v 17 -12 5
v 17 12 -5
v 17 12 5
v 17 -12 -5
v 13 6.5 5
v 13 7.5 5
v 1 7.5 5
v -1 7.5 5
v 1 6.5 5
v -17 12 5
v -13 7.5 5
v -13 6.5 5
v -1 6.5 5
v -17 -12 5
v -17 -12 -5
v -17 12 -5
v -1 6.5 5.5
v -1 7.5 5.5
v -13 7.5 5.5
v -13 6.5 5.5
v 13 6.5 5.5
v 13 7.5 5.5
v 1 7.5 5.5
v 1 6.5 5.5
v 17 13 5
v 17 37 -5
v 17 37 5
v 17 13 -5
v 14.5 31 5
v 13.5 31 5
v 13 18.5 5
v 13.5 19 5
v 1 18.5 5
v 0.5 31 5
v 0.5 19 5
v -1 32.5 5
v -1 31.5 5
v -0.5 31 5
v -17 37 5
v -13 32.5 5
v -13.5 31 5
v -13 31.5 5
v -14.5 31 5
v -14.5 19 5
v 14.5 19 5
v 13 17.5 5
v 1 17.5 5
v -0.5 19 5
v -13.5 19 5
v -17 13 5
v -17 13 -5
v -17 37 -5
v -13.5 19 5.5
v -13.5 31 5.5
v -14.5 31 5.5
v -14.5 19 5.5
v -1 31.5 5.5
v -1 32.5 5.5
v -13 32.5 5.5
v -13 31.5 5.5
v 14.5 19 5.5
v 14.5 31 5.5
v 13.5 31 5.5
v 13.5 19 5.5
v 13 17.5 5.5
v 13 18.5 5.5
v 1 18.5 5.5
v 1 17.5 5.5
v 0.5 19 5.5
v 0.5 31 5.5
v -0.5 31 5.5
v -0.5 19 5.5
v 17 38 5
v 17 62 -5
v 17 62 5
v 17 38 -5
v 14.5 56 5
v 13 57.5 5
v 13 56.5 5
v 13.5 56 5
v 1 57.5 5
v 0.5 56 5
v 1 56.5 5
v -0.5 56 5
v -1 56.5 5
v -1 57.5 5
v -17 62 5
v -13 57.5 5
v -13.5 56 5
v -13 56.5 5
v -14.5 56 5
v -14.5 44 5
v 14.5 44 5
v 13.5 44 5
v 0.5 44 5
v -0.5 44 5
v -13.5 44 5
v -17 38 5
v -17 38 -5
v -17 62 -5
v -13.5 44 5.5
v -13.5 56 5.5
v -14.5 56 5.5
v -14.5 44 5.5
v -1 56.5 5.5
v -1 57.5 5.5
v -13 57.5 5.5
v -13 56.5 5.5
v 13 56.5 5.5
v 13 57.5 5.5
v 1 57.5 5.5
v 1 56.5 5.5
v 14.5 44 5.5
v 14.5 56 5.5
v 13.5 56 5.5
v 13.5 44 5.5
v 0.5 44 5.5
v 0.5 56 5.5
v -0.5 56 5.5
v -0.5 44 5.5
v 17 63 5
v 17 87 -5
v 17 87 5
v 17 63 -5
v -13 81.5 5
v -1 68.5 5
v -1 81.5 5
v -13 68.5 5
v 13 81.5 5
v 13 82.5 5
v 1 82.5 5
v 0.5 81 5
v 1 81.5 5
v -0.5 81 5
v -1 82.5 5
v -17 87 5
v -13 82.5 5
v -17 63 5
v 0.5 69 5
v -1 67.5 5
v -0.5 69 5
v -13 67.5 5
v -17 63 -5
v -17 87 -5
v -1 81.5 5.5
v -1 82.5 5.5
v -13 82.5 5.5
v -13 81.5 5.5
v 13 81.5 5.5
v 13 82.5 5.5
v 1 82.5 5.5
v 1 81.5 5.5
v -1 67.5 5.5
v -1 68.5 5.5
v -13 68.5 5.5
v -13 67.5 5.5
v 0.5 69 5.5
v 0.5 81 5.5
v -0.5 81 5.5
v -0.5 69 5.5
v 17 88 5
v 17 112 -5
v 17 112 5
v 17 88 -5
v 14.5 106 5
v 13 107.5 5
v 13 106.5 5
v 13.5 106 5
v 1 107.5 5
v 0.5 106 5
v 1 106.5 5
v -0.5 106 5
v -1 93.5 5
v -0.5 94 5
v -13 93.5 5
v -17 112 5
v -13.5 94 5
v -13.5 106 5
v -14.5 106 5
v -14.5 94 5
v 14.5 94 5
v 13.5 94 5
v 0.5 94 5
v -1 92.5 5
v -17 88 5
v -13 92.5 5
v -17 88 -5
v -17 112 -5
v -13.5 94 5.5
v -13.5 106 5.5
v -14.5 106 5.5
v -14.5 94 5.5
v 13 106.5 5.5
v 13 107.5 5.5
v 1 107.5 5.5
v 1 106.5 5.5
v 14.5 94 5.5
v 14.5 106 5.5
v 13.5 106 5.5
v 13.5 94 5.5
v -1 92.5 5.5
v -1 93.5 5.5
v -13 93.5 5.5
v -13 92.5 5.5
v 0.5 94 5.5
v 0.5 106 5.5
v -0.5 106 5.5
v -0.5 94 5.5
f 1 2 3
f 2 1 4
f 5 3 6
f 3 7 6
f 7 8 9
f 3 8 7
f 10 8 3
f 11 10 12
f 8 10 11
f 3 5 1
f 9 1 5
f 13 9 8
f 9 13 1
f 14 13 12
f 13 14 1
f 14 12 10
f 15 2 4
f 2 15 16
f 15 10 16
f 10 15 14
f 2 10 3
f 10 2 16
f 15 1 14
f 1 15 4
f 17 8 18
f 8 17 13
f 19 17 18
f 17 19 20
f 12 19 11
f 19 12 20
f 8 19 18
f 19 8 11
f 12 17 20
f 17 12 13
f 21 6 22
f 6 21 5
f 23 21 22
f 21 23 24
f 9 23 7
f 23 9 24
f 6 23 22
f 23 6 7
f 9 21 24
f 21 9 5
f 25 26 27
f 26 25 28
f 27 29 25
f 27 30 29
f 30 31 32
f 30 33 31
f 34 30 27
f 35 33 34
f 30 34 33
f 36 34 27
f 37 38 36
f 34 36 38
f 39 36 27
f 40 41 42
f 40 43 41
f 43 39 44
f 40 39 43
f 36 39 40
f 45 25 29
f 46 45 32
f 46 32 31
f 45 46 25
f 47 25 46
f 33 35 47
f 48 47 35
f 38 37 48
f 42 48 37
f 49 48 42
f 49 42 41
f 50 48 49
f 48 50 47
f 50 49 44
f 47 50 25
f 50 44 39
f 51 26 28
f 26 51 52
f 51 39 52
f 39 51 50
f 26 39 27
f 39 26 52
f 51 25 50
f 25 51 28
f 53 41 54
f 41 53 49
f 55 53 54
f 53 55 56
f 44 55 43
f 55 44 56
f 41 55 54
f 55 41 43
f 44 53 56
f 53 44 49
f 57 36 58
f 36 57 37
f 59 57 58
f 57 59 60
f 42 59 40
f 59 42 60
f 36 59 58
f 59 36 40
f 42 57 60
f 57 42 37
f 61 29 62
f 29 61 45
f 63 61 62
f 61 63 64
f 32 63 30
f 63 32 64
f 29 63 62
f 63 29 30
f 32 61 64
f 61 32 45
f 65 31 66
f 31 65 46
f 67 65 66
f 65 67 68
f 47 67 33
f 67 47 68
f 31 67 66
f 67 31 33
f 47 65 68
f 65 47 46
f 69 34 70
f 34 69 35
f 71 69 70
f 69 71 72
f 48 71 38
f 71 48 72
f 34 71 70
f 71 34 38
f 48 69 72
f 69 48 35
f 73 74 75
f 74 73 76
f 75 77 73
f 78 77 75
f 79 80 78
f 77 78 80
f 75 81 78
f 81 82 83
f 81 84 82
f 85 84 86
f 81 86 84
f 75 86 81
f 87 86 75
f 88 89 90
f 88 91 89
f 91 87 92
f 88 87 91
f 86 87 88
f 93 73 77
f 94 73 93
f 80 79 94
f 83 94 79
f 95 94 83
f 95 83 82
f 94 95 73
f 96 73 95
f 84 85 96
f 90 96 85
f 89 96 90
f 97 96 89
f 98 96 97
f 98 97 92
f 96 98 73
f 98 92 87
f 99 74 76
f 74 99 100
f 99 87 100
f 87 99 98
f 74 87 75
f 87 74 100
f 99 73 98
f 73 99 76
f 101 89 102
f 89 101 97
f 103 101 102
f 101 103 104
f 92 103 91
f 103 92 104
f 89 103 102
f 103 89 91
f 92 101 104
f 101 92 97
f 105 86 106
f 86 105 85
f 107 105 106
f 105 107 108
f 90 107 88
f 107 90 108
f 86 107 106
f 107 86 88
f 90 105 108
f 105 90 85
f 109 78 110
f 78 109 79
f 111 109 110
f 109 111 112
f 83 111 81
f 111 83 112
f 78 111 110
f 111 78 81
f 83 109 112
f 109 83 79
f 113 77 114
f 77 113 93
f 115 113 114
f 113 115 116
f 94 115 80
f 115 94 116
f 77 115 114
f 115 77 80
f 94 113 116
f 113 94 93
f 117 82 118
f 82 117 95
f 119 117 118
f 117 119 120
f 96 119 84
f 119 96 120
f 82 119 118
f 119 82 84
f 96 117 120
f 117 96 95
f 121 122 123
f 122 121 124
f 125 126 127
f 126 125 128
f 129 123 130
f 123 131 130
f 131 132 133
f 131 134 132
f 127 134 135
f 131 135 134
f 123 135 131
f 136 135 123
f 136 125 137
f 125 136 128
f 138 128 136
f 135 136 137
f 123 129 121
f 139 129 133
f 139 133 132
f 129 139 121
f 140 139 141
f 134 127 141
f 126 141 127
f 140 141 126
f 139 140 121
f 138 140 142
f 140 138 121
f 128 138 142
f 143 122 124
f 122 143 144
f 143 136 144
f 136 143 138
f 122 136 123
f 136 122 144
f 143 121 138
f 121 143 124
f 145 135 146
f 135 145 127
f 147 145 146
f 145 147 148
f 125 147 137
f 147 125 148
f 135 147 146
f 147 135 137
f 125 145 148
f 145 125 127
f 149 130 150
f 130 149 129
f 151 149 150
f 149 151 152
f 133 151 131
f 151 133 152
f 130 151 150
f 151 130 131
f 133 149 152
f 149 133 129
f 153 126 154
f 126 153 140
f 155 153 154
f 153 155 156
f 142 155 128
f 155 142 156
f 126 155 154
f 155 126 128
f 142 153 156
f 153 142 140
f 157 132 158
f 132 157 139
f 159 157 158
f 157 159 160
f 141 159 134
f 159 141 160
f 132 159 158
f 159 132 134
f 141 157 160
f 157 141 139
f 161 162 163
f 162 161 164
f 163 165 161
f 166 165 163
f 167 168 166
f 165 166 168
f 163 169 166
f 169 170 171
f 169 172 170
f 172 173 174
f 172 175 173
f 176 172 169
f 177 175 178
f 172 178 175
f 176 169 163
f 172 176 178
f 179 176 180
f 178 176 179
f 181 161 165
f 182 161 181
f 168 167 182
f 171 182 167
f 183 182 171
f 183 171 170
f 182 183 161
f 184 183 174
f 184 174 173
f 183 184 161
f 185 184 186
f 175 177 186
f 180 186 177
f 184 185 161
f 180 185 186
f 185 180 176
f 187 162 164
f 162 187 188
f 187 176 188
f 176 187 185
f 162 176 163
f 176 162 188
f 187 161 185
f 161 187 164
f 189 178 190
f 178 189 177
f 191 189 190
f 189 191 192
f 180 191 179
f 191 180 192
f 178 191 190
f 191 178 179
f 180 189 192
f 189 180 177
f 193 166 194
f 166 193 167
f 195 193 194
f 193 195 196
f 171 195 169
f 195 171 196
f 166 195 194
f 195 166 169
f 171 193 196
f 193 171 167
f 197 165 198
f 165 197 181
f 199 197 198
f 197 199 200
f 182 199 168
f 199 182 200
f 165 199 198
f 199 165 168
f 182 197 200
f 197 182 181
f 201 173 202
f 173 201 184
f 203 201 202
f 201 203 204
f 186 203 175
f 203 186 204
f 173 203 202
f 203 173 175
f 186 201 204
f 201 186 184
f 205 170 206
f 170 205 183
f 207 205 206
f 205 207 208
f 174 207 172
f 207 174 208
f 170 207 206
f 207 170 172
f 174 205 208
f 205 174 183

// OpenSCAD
module sevenseg(number,dot=0) {
    
    if (number==1) {encode=[0,1,1,0,0,0,0,dot]; sevensegnumber(encode);}
    if (number==2) {encode=[1,1,0,1,1,0,1,dot]; sevensegnumber(encode);}
    if (number==3) {encode=[1,1,1,1,0,0,1,dot]; sevensegnumber(encode);}
    if (number==4) {encode=[0,1,1,0,0,1,1,dot]; sevensegnumber(encode);}
    if (number==5) {encode=[1,0,1,1,0,1,1,dot]; sevensegnumber(encode);}
    if (number==6) {encode=[1,0,1,1,1,1,1,dot]; sevensegnumber(encode);}
    if (number==7) {encode=[1,1,1,0,0,0,0,dot]; sevensegnumber(encode);}
    if (number==8) {encode=[1,1,1,1,1,1,1,dot]; sevensegnumber(encode);}
    if (number==9) {encode=[1,1,1,1,0,1,1,dot]; sevensegnumber(encode);}
    if (number==0) {encode=[1,1,1,1,1,1,0,dot]; sevensegnumber(encode);}
}
sevensegarray([1,2,3,4,5]);
//sevenseg(8);


module sevensegnumber(encode) {
    color("black") translate([0,0,0]) cube([34,24,10],center=true);
    
    if (encode[0]==1) { translate([-14,+0,5]) color("red") cube([ 1,12,1],center=true);}
    if (encode[1]==1) { translate([- 7,+7,5]) color("red") cube([12, 1,1],center=true);}
    if (encode[2]==1) { translate([  7,+7,5]) color("red") cube([12, 1,1],center=true);}
    if (encode[3]==1) { translate([+14,+0,5]) color("red") cube([ 1,12,1],center=true);}
    if (encode[4]==1) { translate([+ 7,-7,5]) color("red") cube([12, 1,1],center=true);}
    if (encode[5]==1) { translate([- 7,-7,5]) color("red") cube([12, 1,1],center=true);}
    if (encode[6]==1) { translate([+ 0,+0,5]) color("red") cube([ 1,12,1],center=true);}
    if (encode[7]==1) { translate([ 15,+9,5]) color("red") cube([ 1.25, 1.25,1],center=true);}
}

module sevensegarray(content,Scale=1) {

    scale(Scale) for (i=[0:1:len(content)-1]) {
        translate([0,i*25,0]) sevenseg(content[i]);
    }
}
